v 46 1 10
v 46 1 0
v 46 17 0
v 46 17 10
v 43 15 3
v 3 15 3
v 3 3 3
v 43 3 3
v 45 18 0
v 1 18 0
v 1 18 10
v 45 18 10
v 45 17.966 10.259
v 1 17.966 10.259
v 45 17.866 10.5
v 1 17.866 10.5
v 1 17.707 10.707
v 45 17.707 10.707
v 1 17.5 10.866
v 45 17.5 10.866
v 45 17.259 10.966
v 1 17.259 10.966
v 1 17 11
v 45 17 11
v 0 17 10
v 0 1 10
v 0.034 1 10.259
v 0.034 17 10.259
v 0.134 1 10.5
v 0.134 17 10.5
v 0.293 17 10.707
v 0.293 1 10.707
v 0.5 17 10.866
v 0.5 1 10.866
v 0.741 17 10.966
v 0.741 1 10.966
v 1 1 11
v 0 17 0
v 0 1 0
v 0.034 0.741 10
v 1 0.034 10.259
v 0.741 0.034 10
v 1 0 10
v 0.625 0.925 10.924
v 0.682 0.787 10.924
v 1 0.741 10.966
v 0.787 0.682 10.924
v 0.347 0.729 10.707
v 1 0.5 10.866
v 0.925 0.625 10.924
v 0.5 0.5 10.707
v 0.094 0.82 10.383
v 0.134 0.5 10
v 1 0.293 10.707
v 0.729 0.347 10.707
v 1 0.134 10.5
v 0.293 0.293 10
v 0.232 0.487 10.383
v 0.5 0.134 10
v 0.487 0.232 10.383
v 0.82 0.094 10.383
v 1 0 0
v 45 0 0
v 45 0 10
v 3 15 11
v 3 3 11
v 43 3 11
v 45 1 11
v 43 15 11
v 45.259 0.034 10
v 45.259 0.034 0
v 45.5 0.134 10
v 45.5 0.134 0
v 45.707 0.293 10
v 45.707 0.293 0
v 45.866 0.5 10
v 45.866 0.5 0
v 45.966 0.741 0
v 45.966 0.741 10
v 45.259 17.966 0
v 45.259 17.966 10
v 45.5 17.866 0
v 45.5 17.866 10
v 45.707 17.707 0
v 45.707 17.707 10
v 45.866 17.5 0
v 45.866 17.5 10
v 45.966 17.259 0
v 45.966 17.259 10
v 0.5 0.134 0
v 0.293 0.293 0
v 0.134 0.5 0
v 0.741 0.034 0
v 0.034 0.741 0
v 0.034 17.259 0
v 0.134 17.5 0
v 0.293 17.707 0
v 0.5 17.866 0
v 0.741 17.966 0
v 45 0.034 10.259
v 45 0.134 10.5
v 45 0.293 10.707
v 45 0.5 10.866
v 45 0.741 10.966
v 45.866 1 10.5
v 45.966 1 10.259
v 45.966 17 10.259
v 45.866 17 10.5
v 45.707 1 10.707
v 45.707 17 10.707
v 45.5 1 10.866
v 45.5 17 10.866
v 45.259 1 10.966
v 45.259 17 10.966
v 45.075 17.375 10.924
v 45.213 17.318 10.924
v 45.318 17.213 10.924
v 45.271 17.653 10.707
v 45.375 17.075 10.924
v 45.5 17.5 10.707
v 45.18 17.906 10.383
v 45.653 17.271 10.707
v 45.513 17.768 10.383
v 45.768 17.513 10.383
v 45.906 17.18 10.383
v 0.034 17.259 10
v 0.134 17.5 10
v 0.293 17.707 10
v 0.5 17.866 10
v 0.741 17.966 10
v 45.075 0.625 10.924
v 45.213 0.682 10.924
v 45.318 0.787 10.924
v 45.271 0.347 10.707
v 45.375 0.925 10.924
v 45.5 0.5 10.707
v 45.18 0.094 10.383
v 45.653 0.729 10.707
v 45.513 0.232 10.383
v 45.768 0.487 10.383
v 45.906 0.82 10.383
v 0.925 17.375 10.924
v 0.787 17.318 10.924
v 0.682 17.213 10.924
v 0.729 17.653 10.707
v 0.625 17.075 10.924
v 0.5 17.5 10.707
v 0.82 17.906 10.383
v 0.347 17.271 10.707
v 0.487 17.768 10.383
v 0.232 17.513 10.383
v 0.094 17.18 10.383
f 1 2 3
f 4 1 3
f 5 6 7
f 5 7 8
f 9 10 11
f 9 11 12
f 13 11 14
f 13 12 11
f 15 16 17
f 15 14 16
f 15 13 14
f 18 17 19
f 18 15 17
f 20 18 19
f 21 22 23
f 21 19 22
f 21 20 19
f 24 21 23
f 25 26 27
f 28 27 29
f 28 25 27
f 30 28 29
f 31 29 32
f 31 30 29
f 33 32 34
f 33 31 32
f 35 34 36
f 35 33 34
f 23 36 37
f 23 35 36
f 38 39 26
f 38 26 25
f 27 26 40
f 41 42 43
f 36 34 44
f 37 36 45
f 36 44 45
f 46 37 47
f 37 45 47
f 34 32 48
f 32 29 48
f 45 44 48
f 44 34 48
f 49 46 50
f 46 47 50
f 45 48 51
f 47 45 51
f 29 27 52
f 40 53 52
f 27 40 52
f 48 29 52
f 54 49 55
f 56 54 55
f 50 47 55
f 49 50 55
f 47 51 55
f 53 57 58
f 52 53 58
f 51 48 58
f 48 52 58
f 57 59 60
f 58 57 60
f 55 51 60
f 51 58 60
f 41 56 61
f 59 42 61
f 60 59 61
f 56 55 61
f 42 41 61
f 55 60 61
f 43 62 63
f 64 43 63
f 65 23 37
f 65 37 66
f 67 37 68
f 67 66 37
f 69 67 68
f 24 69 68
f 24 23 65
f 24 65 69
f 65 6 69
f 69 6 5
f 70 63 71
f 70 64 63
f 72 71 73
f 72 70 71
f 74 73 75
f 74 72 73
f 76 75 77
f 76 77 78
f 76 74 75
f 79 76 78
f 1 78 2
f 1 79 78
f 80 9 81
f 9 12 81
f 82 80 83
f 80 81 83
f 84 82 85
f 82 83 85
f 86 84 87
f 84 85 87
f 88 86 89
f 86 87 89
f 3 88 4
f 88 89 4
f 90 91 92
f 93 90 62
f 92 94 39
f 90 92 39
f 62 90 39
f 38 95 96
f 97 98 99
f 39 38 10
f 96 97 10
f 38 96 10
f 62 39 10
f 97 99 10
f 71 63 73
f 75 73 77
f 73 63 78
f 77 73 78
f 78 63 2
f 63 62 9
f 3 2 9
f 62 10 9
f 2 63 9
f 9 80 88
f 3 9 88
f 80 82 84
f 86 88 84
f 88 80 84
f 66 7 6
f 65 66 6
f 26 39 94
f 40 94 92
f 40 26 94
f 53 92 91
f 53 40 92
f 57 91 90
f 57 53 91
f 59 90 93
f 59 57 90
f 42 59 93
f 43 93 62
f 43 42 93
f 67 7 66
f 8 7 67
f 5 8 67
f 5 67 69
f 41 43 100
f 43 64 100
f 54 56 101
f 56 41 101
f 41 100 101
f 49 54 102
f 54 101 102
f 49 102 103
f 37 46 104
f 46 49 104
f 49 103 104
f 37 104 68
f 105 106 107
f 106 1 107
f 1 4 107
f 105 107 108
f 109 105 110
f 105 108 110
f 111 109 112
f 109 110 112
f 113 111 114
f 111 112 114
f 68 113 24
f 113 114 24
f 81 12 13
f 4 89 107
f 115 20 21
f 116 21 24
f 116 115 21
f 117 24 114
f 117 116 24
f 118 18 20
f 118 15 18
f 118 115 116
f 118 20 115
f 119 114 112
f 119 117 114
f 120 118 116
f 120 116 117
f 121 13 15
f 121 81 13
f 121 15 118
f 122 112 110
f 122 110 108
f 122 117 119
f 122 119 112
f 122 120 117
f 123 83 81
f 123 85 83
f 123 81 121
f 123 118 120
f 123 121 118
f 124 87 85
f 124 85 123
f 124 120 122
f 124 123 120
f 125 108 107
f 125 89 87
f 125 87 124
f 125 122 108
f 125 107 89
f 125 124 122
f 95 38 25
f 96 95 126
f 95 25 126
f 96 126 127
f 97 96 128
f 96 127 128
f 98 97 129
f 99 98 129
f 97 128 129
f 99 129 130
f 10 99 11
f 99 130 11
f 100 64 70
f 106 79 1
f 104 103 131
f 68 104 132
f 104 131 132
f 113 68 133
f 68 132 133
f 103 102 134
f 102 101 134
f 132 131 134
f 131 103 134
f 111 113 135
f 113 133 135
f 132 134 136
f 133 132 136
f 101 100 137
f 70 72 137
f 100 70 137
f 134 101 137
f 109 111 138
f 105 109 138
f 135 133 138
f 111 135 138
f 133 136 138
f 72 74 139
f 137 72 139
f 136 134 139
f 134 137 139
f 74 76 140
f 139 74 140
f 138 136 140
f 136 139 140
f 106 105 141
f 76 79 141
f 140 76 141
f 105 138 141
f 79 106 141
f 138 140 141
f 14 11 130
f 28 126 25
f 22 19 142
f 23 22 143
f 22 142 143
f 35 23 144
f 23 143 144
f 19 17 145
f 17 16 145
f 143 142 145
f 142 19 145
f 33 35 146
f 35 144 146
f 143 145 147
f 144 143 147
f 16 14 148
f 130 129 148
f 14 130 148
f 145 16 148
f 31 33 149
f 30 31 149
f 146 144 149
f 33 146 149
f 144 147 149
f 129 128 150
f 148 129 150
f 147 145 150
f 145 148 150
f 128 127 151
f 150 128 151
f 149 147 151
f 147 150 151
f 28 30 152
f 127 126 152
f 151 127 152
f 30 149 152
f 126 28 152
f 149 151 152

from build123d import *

# Parameters (mm, degrees)
F0_W     = 46
F0_H     = 18
F0_W_2   = 40
F0_H_2   = 12
F1_DEPTH = 11
F2_W     = 40
F2_H     = 12
F3_DEPTH = 3
F4_R     = 1


with BuildPart() as f1:
    # F0 (on Top) → F1 (new body)
    with BuildSketch(Plane.XY):
        with Locations((23, 9)):
            Rectangle(F0_W, F0_H)
        with Locations((23, 9)):
            Rectangle(F0_W_2, F0_H_2, mode=Mode.SUBTRACT)
    extrude(amount=F1_DEPTH)

    # F2 (on Top) → F3 (join)
    with BuildSketch(Plane.XY):
        with Locations((23, 9)):
            Rectangle(F2_W, F2_H)
    extrude(amount=F3_DEPTH)

    # F4
    f4_edges = [f1.edges().sort_by_distance(p)[0] for p in [
        (46, 18, 5.5),
        (46, 0, 5.5),
        (0, 0, 5.5),
        (0, 18, 5.5),
        (23, 18, 11),
        (0, 9, 11),
        (23, 0, 11),
        (46, 9, 11),
    ]]
    fillet(f4_edges, radius=F4_R)


solid = f1.part
